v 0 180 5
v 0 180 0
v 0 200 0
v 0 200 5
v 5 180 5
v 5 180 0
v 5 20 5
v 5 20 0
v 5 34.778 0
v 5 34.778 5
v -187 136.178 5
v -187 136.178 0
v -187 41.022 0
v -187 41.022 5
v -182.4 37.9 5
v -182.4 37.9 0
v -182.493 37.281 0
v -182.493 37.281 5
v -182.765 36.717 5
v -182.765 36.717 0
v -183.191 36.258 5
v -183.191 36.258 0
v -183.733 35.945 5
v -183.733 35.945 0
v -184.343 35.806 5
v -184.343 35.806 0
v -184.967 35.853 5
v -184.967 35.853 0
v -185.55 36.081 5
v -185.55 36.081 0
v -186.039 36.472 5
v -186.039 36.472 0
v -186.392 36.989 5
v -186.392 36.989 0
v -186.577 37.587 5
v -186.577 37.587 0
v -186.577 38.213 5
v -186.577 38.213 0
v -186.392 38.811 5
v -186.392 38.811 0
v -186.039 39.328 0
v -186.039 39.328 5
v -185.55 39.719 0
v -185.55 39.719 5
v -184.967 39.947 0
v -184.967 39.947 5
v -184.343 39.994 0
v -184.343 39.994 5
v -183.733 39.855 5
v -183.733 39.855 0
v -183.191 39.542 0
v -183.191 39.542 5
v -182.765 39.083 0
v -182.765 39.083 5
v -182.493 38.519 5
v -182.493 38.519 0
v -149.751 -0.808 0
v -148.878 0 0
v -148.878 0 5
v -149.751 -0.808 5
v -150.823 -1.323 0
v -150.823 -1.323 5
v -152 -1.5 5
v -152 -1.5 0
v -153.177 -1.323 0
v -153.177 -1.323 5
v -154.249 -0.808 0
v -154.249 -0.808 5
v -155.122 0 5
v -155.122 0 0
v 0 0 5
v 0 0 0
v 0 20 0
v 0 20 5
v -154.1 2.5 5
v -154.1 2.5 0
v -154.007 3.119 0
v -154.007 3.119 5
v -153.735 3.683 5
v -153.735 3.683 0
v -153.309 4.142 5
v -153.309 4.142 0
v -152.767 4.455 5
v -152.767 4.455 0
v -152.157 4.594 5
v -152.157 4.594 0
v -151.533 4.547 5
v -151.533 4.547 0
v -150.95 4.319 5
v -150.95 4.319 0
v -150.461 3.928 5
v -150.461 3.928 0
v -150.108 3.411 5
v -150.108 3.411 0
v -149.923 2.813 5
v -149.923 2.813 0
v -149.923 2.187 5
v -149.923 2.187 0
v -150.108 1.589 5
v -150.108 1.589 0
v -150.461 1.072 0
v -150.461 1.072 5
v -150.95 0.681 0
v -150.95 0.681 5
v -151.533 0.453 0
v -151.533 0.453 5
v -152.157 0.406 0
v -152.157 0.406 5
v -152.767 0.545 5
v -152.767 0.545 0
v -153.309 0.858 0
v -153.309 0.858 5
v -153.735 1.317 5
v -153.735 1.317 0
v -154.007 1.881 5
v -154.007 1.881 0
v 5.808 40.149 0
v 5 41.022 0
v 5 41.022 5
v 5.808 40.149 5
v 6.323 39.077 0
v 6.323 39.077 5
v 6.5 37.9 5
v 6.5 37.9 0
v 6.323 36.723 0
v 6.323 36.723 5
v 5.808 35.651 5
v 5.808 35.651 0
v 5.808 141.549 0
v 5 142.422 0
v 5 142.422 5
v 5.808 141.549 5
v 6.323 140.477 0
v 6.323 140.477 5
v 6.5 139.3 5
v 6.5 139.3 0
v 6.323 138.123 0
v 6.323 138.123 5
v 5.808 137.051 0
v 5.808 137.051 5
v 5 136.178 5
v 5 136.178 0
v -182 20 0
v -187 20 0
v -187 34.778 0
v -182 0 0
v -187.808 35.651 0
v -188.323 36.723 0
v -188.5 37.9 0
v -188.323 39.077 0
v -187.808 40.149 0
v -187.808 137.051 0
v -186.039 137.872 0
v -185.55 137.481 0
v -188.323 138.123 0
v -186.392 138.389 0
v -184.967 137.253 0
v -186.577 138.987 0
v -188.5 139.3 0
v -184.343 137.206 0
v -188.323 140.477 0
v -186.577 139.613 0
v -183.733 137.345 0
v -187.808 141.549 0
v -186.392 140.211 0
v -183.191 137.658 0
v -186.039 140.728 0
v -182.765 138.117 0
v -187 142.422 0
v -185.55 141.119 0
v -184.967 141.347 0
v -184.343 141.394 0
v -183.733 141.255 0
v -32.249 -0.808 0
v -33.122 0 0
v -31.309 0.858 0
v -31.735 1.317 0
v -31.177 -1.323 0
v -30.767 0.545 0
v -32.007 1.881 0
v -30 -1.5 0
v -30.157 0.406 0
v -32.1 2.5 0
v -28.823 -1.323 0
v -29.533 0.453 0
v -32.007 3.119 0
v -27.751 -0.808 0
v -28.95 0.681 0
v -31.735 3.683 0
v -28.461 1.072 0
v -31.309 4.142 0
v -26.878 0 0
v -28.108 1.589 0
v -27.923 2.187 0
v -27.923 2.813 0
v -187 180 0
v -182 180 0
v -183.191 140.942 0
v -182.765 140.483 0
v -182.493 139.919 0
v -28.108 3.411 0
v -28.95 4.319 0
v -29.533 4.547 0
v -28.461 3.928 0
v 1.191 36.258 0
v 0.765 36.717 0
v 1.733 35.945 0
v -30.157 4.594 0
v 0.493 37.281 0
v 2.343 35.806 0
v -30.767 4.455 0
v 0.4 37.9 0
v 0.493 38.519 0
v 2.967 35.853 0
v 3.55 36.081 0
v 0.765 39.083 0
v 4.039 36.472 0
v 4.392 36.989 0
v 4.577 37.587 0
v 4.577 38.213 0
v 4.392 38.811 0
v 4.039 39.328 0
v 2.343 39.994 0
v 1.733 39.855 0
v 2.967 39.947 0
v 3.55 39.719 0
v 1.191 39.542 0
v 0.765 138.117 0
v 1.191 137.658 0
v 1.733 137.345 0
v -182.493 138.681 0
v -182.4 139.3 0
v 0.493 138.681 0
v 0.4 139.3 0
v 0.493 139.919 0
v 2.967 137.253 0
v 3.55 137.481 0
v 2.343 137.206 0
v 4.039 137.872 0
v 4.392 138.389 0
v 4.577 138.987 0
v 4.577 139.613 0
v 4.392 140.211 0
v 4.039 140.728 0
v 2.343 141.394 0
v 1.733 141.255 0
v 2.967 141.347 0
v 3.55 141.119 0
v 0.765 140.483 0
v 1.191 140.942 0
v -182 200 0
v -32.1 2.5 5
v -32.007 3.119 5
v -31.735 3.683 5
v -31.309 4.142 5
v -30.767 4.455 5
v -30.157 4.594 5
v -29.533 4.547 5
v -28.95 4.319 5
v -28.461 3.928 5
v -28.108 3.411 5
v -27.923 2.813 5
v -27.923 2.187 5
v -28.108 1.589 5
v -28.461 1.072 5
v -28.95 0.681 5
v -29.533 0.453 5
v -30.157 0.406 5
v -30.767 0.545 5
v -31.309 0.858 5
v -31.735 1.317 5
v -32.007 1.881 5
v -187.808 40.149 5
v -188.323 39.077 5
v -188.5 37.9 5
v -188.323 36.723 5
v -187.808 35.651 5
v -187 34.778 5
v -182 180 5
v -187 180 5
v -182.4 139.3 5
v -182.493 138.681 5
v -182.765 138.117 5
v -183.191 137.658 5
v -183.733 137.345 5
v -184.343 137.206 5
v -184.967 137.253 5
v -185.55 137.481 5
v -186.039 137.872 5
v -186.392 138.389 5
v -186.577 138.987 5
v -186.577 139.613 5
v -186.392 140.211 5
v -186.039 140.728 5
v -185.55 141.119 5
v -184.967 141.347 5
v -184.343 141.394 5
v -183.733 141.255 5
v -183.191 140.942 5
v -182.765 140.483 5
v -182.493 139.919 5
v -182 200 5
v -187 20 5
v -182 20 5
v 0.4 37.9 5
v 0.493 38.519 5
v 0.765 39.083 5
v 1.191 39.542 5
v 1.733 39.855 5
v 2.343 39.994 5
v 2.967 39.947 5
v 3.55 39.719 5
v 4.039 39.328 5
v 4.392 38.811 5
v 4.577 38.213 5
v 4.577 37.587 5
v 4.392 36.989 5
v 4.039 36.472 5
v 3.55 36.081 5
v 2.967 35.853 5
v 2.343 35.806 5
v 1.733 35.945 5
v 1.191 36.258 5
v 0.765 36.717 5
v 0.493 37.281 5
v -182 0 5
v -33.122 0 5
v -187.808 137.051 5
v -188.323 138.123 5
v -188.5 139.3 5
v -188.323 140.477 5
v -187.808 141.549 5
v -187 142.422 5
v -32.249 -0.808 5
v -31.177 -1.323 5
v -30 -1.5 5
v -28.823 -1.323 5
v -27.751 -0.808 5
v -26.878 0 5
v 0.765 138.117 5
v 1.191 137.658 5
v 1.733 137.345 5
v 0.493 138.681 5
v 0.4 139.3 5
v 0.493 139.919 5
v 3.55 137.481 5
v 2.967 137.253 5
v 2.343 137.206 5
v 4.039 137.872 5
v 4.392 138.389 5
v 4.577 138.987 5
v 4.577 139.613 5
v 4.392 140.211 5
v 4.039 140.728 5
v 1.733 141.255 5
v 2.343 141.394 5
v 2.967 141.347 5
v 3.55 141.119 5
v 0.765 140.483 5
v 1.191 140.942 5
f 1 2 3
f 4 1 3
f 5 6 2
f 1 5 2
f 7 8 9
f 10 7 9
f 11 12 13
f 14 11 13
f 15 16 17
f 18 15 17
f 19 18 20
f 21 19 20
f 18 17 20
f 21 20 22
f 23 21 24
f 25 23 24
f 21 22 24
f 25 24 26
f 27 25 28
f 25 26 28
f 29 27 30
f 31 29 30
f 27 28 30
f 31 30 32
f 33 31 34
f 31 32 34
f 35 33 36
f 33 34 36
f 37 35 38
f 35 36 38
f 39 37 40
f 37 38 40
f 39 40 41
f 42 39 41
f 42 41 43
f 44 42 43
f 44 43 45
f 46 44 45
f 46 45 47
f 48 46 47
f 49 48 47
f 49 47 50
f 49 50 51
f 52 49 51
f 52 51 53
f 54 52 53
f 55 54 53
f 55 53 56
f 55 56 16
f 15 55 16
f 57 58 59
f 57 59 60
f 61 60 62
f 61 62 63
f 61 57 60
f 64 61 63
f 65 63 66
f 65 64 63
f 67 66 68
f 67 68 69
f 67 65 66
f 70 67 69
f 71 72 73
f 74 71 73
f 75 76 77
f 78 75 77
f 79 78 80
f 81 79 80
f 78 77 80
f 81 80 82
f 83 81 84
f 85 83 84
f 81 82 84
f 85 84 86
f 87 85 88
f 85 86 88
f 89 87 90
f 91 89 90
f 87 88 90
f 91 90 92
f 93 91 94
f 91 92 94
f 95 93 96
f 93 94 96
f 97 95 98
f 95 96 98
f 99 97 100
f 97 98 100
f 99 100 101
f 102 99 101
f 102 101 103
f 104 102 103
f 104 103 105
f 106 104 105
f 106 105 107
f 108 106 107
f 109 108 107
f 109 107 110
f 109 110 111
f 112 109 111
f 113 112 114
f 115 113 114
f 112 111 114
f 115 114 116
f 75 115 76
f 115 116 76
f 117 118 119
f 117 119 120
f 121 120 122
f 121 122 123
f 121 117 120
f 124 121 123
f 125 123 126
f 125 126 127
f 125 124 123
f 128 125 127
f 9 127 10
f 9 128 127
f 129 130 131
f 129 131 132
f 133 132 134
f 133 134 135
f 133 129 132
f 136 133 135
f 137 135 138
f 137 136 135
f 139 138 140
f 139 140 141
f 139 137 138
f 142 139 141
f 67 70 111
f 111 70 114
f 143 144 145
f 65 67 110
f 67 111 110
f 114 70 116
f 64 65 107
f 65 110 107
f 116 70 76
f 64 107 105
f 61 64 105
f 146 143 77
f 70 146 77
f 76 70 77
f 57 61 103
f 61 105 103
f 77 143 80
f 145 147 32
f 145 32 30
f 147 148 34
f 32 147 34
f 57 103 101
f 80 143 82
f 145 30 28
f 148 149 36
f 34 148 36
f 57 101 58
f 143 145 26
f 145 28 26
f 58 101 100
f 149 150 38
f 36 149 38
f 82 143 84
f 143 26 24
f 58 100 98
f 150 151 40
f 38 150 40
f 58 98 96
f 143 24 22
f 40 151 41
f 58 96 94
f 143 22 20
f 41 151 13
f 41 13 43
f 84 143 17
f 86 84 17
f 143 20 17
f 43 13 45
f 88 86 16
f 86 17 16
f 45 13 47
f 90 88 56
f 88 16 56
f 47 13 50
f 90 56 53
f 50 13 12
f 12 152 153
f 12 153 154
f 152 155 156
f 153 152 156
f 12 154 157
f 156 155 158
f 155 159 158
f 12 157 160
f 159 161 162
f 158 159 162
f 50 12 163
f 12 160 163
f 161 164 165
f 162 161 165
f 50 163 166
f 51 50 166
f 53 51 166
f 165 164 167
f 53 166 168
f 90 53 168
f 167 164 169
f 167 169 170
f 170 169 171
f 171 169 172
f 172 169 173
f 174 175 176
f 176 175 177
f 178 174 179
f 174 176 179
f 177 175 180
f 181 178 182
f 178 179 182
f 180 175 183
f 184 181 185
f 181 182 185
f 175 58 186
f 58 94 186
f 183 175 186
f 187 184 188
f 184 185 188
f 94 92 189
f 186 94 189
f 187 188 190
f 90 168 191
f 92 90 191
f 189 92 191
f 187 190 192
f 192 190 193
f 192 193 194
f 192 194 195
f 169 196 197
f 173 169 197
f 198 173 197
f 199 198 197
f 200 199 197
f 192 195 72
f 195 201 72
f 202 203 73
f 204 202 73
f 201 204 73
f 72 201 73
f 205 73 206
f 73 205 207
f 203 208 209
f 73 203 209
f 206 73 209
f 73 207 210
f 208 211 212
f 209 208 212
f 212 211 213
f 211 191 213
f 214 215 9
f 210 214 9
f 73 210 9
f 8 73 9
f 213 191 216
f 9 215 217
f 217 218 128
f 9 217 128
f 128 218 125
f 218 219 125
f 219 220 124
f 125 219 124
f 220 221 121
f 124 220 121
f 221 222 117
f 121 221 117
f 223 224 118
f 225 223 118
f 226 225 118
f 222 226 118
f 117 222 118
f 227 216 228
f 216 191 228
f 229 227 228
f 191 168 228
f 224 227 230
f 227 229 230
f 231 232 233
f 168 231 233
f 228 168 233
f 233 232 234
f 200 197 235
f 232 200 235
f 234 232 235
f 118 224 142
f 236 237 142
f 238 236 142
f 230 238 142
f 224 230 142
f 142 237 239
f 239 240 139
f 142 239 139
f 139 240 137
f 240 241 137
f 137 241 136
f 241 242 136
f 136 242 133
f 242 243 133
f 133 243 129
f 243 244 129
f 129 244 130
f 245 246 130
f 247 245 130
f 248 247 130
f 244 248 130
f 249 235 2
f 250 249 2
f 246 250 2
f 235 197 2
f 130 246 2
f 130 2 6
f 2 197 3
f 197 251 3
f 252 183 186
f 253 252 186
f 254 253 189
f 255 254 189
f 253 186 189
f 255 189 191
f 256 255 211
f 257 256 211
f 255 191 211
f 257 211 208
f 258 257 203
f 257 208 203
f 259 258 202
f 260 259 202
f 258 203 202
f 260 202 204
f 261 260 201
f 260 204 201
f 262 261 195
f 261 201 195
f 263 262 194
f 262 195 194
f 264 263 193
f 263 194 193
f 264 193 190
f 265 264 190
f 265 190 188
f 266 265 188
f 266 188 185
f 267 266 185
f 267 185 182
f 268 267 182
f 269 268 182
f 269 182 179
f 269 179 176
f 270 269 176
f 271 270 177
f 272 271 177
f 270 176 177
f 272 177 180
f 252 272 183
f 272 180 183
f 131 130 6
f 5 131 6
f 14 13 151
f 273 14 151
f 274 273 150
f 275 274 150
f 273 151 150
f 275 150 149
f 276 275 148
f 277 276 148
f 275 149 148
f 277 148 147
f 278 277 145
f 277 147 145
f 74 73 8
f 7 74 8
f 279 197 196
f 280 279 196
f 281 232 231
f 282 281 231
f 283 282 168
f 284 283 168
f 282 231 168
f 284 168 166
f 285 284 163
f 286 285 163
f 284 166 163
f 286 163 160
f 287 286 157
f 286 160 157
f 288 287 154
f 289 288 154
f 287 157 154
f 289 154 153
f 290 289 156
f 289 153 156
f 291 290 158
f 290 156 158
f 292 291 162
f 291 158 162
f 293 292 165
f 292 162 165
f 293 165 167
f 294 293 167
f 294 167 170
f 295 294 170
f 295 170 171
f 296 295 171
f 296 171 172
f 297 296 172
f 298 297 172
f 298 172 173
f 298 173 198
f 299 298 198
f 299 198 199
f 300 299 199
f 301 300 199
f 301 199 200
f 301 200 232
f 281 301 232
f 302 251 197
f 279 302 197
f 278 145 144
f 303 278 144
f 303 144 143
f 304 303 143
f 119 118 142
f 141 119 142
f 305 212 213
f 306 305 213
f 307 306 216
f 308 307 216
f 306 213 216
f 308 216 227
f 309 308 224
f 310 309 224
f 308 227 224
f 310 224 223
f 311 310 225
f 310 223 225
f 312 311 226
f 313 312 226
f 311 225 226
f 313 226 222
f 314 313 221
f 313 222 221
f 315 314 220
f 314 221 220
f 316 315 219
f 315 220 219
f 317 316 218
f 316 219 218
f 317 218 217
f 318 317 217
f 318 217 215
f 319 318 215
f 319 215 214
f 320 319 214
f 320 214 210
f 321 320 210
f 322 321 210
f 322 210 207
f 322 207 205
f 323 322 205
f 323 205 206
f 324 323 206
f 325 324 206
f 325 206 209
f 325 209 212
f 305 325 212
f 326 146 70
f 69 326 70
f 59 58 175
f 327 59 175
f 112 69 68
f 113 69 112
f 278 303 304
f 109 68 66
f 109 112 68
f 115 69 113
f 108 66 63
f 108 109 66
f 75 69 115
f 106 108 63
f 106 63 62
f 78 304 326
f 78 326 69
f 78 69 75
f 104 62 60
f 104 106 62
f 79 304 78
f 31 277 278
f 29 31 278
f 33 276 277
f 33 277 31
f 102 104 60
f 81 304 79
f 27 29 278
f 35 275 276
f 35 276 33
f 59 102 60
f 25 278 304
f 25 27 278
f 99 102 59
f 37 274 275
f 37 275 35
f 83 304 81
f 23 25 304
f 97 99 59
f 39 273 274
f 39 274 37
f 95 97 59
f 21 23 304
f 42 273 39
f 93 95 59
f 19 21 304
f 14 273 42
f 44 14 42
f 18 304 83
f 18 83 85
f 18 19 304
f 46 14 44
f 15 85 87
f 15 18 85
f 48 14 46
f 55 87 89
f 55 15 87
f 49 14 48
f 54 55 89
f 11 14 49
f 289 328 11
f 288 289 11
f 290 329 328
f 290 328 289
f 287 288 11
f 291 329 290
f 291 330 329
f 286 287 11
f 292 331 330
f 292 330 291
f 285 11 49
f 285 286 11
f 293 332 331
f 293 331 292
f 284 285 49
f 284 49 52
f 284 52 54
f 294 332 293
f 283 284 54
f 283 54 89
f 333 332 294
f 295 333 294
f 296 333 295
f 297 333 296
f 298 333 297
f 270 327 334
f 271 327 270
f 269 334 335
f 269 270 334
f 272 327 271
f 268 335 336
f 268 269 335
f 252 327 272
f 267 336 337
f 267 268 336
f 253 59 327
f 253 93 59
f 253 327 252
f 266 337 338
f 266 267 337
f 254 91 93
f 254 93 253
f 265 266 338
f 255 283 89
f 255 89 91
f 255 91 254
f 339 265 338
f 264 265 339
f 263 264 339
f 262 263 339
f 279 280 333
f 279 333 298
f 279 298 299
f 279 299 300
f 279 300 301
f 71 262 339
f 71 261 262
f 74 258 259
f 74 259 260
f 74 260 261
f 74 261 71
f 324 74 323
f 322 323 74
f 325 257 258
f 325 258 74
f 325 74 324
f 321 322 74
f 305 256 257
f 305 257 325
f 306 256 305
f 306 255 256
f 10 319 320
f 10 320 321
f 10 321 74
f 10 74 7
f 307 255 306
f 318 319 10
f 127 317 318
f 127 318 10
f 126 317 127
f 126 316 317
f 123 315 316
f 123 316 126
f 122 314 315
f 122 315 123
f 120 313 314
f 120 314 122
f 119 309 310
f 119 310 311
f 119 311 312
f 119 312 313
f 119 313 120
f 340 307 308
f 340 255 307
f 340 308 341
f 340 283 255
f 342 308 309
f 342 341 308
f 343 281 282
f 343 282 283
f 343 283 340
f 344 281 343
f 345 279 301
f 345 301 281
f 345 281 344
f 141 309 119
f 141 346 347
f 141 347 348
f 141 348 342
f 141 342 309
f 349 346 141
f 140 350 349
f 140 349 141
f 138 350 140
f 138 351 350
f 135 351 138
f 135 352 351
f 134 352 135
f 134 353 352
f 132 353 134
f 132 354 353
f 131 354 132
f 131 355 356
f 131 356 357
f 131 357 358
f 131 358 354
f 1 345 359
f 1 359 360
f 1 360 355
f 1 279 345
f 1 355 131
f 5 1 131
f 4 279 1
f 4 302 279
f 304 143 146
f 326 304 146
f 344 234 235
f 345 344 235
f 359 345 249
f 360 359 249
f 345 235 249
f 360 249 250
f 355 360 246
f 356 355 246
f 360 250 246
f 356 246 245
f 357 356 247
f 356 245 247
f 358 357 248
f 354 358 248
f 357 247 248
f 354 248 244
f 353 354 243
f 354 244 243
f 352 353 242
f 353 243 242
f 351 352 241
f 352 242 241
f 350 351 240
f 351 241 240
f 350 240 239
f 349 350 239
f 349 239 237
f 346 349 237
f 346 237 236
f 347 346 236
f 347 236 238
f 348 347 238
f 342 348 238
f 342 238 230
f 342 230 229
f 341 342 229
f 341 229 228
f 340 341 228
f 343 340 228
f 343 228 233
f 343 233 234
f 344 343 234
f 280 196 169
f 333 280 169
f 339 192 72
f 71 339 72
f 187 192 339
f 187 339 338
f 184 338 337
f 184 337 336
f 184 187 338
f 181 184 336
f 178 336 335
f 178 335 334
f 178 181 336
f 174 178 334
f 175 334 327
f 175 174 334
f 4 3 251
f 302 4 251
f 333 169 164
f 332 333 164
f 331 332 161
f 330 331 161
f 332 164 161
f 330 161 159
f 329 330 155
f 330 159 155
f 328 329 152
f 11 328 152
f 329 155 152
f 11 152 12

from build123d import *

# Parameters (mm, degrees)
BOSS_EXTRUDE1_DEPTH = 5
SKETCH2_R           = 2.1
CUT_EXTRUDE1_DEPTH  = 10
BOSS_EXTRUDE2_DEPTH = 5
BOSS_EXTRUDE3_DEPTH = 5
SKETCH5_R           = 2.1
CUT_EXTRUDE2_DEPTH  = 5
BOSS_EXTRUDE4_DEPTH = 5


with BuildPart() as part:
    # Sketch1 → Boss-Extrude1 (new body)
    with BuildSketch(Plane.XY):
        Polygon((-182, 200), (-182, 180), (-187, 180), (-187, 20), (-182, 20), (-182, 0), (0, 0), (0, 20), (5, 20), (5, 180), (0, 180), (0, 200), align=None)
    extrude(amount=BOSS_EXTRUDE1_DEPTH)

    # Sketch2 → Cut-Extrude1 (cut)
    with BuildSketch(Plane(origin=(0, 0, 0), x_dir=(-1, 0, 0), z_dir=(0, 0, -1))):
        with Locations((-2.5, 139.3)):
            Circle(SKETCH2_R)
        with Locations((-2.5, 37.9)):
            Circle(SKETCH2_R)
        with Locations(Location((184.5, 37.9, 0), (0, 0, 180))):
            Circle(SKETCH2_R)
        with Locations(Location((184.5, 139.3, 0), (0, 0, 180))):
            Circle(SKETCH2_R)
    extrude(amount=-CUT_EXTRUDE1_DEPTH, mode=Mode.SUBTRACT)

    # Sketch3 → Boss-Extrude2 (add)
    with BuildSketch(Plane(origin=(0, 0, 0), x_dir=(-1, 0, 0), z_dir=(0, 0, -1))):
        with BuildLine():
            Line((-5, 136.177501001), (-5, 142.422498999))
            ThreePointArc((-5, 142.422498999), (-6.5, 139.3), (-5, 136.177501001))
        make_face()
    boss_extrude2 = extrude(amount=-BOSS_EXTRUDE2_DEPTH)

    # Sketch4 → Boss-Extrude3 (add)
    with BuildSketch(Plane(origin=(0, 0, 0), x_dir=(-1, 0, 0), z_dir=(0, 0, -1))):
        with BuildLine():
            Line((-5, 34.777501001), (-5, 41.022498999))
            ThreePointArc((-5, 41.022498999), (-6.5, 37.9), (-5, 34.777501001))
        make_face()
    boss_extrude3 = extrude(amount=-BOSS_EXTRUDE3_DEPTH)

    # Mirror1: Boss-Extrude2, Boss-Extrude3 across plane
    add(boss_extrude2.mirror(Plane.ZY.offset(91)))
    add(boss_extrude3.mirror(Plane.ZY.offset(91)))

    # Sketch5 → Cut-Extrude2 (cut)
    with BuildSketch(Plane(origin=(0, 0, 0), x_dir=(-1, 0, 0), z_dir=(0, 0, -1))):
        with Locations((30, 2.5)):
            Circle(SKETCH5_R)
        with Locations((152, 2.5)):
            Circle(SKETCH5_R)
    extrude(amount=-CUT_EXTRUDE2_DEPTH, mode=Mode.SUBTRACT)

    # Sketch6 → Boss-Extrude4 (add)
    with BuildSketch(Plane(origin=(0, 0, 0), x_dir=(-1, 0, 0), z_dir=(0, 0, -1))):
        with BuildLine():
            Line((155.122498999, 0), (148.877501001, 0))
            ThreePointArc((148.877501001, 0), (152, -1.5), (155.122498999, 0))
        make_face()
        with BuildLine():
            Line((33.122498999, 0), (26.877501001, 0))
            ThreePointArc((26.877501001, 0), (30, -1.5), (33.122498999, 0))
        make_face()
    extrude(amount=-BOSS_EXTRUDE4_DEPTH)


solid = part.part
